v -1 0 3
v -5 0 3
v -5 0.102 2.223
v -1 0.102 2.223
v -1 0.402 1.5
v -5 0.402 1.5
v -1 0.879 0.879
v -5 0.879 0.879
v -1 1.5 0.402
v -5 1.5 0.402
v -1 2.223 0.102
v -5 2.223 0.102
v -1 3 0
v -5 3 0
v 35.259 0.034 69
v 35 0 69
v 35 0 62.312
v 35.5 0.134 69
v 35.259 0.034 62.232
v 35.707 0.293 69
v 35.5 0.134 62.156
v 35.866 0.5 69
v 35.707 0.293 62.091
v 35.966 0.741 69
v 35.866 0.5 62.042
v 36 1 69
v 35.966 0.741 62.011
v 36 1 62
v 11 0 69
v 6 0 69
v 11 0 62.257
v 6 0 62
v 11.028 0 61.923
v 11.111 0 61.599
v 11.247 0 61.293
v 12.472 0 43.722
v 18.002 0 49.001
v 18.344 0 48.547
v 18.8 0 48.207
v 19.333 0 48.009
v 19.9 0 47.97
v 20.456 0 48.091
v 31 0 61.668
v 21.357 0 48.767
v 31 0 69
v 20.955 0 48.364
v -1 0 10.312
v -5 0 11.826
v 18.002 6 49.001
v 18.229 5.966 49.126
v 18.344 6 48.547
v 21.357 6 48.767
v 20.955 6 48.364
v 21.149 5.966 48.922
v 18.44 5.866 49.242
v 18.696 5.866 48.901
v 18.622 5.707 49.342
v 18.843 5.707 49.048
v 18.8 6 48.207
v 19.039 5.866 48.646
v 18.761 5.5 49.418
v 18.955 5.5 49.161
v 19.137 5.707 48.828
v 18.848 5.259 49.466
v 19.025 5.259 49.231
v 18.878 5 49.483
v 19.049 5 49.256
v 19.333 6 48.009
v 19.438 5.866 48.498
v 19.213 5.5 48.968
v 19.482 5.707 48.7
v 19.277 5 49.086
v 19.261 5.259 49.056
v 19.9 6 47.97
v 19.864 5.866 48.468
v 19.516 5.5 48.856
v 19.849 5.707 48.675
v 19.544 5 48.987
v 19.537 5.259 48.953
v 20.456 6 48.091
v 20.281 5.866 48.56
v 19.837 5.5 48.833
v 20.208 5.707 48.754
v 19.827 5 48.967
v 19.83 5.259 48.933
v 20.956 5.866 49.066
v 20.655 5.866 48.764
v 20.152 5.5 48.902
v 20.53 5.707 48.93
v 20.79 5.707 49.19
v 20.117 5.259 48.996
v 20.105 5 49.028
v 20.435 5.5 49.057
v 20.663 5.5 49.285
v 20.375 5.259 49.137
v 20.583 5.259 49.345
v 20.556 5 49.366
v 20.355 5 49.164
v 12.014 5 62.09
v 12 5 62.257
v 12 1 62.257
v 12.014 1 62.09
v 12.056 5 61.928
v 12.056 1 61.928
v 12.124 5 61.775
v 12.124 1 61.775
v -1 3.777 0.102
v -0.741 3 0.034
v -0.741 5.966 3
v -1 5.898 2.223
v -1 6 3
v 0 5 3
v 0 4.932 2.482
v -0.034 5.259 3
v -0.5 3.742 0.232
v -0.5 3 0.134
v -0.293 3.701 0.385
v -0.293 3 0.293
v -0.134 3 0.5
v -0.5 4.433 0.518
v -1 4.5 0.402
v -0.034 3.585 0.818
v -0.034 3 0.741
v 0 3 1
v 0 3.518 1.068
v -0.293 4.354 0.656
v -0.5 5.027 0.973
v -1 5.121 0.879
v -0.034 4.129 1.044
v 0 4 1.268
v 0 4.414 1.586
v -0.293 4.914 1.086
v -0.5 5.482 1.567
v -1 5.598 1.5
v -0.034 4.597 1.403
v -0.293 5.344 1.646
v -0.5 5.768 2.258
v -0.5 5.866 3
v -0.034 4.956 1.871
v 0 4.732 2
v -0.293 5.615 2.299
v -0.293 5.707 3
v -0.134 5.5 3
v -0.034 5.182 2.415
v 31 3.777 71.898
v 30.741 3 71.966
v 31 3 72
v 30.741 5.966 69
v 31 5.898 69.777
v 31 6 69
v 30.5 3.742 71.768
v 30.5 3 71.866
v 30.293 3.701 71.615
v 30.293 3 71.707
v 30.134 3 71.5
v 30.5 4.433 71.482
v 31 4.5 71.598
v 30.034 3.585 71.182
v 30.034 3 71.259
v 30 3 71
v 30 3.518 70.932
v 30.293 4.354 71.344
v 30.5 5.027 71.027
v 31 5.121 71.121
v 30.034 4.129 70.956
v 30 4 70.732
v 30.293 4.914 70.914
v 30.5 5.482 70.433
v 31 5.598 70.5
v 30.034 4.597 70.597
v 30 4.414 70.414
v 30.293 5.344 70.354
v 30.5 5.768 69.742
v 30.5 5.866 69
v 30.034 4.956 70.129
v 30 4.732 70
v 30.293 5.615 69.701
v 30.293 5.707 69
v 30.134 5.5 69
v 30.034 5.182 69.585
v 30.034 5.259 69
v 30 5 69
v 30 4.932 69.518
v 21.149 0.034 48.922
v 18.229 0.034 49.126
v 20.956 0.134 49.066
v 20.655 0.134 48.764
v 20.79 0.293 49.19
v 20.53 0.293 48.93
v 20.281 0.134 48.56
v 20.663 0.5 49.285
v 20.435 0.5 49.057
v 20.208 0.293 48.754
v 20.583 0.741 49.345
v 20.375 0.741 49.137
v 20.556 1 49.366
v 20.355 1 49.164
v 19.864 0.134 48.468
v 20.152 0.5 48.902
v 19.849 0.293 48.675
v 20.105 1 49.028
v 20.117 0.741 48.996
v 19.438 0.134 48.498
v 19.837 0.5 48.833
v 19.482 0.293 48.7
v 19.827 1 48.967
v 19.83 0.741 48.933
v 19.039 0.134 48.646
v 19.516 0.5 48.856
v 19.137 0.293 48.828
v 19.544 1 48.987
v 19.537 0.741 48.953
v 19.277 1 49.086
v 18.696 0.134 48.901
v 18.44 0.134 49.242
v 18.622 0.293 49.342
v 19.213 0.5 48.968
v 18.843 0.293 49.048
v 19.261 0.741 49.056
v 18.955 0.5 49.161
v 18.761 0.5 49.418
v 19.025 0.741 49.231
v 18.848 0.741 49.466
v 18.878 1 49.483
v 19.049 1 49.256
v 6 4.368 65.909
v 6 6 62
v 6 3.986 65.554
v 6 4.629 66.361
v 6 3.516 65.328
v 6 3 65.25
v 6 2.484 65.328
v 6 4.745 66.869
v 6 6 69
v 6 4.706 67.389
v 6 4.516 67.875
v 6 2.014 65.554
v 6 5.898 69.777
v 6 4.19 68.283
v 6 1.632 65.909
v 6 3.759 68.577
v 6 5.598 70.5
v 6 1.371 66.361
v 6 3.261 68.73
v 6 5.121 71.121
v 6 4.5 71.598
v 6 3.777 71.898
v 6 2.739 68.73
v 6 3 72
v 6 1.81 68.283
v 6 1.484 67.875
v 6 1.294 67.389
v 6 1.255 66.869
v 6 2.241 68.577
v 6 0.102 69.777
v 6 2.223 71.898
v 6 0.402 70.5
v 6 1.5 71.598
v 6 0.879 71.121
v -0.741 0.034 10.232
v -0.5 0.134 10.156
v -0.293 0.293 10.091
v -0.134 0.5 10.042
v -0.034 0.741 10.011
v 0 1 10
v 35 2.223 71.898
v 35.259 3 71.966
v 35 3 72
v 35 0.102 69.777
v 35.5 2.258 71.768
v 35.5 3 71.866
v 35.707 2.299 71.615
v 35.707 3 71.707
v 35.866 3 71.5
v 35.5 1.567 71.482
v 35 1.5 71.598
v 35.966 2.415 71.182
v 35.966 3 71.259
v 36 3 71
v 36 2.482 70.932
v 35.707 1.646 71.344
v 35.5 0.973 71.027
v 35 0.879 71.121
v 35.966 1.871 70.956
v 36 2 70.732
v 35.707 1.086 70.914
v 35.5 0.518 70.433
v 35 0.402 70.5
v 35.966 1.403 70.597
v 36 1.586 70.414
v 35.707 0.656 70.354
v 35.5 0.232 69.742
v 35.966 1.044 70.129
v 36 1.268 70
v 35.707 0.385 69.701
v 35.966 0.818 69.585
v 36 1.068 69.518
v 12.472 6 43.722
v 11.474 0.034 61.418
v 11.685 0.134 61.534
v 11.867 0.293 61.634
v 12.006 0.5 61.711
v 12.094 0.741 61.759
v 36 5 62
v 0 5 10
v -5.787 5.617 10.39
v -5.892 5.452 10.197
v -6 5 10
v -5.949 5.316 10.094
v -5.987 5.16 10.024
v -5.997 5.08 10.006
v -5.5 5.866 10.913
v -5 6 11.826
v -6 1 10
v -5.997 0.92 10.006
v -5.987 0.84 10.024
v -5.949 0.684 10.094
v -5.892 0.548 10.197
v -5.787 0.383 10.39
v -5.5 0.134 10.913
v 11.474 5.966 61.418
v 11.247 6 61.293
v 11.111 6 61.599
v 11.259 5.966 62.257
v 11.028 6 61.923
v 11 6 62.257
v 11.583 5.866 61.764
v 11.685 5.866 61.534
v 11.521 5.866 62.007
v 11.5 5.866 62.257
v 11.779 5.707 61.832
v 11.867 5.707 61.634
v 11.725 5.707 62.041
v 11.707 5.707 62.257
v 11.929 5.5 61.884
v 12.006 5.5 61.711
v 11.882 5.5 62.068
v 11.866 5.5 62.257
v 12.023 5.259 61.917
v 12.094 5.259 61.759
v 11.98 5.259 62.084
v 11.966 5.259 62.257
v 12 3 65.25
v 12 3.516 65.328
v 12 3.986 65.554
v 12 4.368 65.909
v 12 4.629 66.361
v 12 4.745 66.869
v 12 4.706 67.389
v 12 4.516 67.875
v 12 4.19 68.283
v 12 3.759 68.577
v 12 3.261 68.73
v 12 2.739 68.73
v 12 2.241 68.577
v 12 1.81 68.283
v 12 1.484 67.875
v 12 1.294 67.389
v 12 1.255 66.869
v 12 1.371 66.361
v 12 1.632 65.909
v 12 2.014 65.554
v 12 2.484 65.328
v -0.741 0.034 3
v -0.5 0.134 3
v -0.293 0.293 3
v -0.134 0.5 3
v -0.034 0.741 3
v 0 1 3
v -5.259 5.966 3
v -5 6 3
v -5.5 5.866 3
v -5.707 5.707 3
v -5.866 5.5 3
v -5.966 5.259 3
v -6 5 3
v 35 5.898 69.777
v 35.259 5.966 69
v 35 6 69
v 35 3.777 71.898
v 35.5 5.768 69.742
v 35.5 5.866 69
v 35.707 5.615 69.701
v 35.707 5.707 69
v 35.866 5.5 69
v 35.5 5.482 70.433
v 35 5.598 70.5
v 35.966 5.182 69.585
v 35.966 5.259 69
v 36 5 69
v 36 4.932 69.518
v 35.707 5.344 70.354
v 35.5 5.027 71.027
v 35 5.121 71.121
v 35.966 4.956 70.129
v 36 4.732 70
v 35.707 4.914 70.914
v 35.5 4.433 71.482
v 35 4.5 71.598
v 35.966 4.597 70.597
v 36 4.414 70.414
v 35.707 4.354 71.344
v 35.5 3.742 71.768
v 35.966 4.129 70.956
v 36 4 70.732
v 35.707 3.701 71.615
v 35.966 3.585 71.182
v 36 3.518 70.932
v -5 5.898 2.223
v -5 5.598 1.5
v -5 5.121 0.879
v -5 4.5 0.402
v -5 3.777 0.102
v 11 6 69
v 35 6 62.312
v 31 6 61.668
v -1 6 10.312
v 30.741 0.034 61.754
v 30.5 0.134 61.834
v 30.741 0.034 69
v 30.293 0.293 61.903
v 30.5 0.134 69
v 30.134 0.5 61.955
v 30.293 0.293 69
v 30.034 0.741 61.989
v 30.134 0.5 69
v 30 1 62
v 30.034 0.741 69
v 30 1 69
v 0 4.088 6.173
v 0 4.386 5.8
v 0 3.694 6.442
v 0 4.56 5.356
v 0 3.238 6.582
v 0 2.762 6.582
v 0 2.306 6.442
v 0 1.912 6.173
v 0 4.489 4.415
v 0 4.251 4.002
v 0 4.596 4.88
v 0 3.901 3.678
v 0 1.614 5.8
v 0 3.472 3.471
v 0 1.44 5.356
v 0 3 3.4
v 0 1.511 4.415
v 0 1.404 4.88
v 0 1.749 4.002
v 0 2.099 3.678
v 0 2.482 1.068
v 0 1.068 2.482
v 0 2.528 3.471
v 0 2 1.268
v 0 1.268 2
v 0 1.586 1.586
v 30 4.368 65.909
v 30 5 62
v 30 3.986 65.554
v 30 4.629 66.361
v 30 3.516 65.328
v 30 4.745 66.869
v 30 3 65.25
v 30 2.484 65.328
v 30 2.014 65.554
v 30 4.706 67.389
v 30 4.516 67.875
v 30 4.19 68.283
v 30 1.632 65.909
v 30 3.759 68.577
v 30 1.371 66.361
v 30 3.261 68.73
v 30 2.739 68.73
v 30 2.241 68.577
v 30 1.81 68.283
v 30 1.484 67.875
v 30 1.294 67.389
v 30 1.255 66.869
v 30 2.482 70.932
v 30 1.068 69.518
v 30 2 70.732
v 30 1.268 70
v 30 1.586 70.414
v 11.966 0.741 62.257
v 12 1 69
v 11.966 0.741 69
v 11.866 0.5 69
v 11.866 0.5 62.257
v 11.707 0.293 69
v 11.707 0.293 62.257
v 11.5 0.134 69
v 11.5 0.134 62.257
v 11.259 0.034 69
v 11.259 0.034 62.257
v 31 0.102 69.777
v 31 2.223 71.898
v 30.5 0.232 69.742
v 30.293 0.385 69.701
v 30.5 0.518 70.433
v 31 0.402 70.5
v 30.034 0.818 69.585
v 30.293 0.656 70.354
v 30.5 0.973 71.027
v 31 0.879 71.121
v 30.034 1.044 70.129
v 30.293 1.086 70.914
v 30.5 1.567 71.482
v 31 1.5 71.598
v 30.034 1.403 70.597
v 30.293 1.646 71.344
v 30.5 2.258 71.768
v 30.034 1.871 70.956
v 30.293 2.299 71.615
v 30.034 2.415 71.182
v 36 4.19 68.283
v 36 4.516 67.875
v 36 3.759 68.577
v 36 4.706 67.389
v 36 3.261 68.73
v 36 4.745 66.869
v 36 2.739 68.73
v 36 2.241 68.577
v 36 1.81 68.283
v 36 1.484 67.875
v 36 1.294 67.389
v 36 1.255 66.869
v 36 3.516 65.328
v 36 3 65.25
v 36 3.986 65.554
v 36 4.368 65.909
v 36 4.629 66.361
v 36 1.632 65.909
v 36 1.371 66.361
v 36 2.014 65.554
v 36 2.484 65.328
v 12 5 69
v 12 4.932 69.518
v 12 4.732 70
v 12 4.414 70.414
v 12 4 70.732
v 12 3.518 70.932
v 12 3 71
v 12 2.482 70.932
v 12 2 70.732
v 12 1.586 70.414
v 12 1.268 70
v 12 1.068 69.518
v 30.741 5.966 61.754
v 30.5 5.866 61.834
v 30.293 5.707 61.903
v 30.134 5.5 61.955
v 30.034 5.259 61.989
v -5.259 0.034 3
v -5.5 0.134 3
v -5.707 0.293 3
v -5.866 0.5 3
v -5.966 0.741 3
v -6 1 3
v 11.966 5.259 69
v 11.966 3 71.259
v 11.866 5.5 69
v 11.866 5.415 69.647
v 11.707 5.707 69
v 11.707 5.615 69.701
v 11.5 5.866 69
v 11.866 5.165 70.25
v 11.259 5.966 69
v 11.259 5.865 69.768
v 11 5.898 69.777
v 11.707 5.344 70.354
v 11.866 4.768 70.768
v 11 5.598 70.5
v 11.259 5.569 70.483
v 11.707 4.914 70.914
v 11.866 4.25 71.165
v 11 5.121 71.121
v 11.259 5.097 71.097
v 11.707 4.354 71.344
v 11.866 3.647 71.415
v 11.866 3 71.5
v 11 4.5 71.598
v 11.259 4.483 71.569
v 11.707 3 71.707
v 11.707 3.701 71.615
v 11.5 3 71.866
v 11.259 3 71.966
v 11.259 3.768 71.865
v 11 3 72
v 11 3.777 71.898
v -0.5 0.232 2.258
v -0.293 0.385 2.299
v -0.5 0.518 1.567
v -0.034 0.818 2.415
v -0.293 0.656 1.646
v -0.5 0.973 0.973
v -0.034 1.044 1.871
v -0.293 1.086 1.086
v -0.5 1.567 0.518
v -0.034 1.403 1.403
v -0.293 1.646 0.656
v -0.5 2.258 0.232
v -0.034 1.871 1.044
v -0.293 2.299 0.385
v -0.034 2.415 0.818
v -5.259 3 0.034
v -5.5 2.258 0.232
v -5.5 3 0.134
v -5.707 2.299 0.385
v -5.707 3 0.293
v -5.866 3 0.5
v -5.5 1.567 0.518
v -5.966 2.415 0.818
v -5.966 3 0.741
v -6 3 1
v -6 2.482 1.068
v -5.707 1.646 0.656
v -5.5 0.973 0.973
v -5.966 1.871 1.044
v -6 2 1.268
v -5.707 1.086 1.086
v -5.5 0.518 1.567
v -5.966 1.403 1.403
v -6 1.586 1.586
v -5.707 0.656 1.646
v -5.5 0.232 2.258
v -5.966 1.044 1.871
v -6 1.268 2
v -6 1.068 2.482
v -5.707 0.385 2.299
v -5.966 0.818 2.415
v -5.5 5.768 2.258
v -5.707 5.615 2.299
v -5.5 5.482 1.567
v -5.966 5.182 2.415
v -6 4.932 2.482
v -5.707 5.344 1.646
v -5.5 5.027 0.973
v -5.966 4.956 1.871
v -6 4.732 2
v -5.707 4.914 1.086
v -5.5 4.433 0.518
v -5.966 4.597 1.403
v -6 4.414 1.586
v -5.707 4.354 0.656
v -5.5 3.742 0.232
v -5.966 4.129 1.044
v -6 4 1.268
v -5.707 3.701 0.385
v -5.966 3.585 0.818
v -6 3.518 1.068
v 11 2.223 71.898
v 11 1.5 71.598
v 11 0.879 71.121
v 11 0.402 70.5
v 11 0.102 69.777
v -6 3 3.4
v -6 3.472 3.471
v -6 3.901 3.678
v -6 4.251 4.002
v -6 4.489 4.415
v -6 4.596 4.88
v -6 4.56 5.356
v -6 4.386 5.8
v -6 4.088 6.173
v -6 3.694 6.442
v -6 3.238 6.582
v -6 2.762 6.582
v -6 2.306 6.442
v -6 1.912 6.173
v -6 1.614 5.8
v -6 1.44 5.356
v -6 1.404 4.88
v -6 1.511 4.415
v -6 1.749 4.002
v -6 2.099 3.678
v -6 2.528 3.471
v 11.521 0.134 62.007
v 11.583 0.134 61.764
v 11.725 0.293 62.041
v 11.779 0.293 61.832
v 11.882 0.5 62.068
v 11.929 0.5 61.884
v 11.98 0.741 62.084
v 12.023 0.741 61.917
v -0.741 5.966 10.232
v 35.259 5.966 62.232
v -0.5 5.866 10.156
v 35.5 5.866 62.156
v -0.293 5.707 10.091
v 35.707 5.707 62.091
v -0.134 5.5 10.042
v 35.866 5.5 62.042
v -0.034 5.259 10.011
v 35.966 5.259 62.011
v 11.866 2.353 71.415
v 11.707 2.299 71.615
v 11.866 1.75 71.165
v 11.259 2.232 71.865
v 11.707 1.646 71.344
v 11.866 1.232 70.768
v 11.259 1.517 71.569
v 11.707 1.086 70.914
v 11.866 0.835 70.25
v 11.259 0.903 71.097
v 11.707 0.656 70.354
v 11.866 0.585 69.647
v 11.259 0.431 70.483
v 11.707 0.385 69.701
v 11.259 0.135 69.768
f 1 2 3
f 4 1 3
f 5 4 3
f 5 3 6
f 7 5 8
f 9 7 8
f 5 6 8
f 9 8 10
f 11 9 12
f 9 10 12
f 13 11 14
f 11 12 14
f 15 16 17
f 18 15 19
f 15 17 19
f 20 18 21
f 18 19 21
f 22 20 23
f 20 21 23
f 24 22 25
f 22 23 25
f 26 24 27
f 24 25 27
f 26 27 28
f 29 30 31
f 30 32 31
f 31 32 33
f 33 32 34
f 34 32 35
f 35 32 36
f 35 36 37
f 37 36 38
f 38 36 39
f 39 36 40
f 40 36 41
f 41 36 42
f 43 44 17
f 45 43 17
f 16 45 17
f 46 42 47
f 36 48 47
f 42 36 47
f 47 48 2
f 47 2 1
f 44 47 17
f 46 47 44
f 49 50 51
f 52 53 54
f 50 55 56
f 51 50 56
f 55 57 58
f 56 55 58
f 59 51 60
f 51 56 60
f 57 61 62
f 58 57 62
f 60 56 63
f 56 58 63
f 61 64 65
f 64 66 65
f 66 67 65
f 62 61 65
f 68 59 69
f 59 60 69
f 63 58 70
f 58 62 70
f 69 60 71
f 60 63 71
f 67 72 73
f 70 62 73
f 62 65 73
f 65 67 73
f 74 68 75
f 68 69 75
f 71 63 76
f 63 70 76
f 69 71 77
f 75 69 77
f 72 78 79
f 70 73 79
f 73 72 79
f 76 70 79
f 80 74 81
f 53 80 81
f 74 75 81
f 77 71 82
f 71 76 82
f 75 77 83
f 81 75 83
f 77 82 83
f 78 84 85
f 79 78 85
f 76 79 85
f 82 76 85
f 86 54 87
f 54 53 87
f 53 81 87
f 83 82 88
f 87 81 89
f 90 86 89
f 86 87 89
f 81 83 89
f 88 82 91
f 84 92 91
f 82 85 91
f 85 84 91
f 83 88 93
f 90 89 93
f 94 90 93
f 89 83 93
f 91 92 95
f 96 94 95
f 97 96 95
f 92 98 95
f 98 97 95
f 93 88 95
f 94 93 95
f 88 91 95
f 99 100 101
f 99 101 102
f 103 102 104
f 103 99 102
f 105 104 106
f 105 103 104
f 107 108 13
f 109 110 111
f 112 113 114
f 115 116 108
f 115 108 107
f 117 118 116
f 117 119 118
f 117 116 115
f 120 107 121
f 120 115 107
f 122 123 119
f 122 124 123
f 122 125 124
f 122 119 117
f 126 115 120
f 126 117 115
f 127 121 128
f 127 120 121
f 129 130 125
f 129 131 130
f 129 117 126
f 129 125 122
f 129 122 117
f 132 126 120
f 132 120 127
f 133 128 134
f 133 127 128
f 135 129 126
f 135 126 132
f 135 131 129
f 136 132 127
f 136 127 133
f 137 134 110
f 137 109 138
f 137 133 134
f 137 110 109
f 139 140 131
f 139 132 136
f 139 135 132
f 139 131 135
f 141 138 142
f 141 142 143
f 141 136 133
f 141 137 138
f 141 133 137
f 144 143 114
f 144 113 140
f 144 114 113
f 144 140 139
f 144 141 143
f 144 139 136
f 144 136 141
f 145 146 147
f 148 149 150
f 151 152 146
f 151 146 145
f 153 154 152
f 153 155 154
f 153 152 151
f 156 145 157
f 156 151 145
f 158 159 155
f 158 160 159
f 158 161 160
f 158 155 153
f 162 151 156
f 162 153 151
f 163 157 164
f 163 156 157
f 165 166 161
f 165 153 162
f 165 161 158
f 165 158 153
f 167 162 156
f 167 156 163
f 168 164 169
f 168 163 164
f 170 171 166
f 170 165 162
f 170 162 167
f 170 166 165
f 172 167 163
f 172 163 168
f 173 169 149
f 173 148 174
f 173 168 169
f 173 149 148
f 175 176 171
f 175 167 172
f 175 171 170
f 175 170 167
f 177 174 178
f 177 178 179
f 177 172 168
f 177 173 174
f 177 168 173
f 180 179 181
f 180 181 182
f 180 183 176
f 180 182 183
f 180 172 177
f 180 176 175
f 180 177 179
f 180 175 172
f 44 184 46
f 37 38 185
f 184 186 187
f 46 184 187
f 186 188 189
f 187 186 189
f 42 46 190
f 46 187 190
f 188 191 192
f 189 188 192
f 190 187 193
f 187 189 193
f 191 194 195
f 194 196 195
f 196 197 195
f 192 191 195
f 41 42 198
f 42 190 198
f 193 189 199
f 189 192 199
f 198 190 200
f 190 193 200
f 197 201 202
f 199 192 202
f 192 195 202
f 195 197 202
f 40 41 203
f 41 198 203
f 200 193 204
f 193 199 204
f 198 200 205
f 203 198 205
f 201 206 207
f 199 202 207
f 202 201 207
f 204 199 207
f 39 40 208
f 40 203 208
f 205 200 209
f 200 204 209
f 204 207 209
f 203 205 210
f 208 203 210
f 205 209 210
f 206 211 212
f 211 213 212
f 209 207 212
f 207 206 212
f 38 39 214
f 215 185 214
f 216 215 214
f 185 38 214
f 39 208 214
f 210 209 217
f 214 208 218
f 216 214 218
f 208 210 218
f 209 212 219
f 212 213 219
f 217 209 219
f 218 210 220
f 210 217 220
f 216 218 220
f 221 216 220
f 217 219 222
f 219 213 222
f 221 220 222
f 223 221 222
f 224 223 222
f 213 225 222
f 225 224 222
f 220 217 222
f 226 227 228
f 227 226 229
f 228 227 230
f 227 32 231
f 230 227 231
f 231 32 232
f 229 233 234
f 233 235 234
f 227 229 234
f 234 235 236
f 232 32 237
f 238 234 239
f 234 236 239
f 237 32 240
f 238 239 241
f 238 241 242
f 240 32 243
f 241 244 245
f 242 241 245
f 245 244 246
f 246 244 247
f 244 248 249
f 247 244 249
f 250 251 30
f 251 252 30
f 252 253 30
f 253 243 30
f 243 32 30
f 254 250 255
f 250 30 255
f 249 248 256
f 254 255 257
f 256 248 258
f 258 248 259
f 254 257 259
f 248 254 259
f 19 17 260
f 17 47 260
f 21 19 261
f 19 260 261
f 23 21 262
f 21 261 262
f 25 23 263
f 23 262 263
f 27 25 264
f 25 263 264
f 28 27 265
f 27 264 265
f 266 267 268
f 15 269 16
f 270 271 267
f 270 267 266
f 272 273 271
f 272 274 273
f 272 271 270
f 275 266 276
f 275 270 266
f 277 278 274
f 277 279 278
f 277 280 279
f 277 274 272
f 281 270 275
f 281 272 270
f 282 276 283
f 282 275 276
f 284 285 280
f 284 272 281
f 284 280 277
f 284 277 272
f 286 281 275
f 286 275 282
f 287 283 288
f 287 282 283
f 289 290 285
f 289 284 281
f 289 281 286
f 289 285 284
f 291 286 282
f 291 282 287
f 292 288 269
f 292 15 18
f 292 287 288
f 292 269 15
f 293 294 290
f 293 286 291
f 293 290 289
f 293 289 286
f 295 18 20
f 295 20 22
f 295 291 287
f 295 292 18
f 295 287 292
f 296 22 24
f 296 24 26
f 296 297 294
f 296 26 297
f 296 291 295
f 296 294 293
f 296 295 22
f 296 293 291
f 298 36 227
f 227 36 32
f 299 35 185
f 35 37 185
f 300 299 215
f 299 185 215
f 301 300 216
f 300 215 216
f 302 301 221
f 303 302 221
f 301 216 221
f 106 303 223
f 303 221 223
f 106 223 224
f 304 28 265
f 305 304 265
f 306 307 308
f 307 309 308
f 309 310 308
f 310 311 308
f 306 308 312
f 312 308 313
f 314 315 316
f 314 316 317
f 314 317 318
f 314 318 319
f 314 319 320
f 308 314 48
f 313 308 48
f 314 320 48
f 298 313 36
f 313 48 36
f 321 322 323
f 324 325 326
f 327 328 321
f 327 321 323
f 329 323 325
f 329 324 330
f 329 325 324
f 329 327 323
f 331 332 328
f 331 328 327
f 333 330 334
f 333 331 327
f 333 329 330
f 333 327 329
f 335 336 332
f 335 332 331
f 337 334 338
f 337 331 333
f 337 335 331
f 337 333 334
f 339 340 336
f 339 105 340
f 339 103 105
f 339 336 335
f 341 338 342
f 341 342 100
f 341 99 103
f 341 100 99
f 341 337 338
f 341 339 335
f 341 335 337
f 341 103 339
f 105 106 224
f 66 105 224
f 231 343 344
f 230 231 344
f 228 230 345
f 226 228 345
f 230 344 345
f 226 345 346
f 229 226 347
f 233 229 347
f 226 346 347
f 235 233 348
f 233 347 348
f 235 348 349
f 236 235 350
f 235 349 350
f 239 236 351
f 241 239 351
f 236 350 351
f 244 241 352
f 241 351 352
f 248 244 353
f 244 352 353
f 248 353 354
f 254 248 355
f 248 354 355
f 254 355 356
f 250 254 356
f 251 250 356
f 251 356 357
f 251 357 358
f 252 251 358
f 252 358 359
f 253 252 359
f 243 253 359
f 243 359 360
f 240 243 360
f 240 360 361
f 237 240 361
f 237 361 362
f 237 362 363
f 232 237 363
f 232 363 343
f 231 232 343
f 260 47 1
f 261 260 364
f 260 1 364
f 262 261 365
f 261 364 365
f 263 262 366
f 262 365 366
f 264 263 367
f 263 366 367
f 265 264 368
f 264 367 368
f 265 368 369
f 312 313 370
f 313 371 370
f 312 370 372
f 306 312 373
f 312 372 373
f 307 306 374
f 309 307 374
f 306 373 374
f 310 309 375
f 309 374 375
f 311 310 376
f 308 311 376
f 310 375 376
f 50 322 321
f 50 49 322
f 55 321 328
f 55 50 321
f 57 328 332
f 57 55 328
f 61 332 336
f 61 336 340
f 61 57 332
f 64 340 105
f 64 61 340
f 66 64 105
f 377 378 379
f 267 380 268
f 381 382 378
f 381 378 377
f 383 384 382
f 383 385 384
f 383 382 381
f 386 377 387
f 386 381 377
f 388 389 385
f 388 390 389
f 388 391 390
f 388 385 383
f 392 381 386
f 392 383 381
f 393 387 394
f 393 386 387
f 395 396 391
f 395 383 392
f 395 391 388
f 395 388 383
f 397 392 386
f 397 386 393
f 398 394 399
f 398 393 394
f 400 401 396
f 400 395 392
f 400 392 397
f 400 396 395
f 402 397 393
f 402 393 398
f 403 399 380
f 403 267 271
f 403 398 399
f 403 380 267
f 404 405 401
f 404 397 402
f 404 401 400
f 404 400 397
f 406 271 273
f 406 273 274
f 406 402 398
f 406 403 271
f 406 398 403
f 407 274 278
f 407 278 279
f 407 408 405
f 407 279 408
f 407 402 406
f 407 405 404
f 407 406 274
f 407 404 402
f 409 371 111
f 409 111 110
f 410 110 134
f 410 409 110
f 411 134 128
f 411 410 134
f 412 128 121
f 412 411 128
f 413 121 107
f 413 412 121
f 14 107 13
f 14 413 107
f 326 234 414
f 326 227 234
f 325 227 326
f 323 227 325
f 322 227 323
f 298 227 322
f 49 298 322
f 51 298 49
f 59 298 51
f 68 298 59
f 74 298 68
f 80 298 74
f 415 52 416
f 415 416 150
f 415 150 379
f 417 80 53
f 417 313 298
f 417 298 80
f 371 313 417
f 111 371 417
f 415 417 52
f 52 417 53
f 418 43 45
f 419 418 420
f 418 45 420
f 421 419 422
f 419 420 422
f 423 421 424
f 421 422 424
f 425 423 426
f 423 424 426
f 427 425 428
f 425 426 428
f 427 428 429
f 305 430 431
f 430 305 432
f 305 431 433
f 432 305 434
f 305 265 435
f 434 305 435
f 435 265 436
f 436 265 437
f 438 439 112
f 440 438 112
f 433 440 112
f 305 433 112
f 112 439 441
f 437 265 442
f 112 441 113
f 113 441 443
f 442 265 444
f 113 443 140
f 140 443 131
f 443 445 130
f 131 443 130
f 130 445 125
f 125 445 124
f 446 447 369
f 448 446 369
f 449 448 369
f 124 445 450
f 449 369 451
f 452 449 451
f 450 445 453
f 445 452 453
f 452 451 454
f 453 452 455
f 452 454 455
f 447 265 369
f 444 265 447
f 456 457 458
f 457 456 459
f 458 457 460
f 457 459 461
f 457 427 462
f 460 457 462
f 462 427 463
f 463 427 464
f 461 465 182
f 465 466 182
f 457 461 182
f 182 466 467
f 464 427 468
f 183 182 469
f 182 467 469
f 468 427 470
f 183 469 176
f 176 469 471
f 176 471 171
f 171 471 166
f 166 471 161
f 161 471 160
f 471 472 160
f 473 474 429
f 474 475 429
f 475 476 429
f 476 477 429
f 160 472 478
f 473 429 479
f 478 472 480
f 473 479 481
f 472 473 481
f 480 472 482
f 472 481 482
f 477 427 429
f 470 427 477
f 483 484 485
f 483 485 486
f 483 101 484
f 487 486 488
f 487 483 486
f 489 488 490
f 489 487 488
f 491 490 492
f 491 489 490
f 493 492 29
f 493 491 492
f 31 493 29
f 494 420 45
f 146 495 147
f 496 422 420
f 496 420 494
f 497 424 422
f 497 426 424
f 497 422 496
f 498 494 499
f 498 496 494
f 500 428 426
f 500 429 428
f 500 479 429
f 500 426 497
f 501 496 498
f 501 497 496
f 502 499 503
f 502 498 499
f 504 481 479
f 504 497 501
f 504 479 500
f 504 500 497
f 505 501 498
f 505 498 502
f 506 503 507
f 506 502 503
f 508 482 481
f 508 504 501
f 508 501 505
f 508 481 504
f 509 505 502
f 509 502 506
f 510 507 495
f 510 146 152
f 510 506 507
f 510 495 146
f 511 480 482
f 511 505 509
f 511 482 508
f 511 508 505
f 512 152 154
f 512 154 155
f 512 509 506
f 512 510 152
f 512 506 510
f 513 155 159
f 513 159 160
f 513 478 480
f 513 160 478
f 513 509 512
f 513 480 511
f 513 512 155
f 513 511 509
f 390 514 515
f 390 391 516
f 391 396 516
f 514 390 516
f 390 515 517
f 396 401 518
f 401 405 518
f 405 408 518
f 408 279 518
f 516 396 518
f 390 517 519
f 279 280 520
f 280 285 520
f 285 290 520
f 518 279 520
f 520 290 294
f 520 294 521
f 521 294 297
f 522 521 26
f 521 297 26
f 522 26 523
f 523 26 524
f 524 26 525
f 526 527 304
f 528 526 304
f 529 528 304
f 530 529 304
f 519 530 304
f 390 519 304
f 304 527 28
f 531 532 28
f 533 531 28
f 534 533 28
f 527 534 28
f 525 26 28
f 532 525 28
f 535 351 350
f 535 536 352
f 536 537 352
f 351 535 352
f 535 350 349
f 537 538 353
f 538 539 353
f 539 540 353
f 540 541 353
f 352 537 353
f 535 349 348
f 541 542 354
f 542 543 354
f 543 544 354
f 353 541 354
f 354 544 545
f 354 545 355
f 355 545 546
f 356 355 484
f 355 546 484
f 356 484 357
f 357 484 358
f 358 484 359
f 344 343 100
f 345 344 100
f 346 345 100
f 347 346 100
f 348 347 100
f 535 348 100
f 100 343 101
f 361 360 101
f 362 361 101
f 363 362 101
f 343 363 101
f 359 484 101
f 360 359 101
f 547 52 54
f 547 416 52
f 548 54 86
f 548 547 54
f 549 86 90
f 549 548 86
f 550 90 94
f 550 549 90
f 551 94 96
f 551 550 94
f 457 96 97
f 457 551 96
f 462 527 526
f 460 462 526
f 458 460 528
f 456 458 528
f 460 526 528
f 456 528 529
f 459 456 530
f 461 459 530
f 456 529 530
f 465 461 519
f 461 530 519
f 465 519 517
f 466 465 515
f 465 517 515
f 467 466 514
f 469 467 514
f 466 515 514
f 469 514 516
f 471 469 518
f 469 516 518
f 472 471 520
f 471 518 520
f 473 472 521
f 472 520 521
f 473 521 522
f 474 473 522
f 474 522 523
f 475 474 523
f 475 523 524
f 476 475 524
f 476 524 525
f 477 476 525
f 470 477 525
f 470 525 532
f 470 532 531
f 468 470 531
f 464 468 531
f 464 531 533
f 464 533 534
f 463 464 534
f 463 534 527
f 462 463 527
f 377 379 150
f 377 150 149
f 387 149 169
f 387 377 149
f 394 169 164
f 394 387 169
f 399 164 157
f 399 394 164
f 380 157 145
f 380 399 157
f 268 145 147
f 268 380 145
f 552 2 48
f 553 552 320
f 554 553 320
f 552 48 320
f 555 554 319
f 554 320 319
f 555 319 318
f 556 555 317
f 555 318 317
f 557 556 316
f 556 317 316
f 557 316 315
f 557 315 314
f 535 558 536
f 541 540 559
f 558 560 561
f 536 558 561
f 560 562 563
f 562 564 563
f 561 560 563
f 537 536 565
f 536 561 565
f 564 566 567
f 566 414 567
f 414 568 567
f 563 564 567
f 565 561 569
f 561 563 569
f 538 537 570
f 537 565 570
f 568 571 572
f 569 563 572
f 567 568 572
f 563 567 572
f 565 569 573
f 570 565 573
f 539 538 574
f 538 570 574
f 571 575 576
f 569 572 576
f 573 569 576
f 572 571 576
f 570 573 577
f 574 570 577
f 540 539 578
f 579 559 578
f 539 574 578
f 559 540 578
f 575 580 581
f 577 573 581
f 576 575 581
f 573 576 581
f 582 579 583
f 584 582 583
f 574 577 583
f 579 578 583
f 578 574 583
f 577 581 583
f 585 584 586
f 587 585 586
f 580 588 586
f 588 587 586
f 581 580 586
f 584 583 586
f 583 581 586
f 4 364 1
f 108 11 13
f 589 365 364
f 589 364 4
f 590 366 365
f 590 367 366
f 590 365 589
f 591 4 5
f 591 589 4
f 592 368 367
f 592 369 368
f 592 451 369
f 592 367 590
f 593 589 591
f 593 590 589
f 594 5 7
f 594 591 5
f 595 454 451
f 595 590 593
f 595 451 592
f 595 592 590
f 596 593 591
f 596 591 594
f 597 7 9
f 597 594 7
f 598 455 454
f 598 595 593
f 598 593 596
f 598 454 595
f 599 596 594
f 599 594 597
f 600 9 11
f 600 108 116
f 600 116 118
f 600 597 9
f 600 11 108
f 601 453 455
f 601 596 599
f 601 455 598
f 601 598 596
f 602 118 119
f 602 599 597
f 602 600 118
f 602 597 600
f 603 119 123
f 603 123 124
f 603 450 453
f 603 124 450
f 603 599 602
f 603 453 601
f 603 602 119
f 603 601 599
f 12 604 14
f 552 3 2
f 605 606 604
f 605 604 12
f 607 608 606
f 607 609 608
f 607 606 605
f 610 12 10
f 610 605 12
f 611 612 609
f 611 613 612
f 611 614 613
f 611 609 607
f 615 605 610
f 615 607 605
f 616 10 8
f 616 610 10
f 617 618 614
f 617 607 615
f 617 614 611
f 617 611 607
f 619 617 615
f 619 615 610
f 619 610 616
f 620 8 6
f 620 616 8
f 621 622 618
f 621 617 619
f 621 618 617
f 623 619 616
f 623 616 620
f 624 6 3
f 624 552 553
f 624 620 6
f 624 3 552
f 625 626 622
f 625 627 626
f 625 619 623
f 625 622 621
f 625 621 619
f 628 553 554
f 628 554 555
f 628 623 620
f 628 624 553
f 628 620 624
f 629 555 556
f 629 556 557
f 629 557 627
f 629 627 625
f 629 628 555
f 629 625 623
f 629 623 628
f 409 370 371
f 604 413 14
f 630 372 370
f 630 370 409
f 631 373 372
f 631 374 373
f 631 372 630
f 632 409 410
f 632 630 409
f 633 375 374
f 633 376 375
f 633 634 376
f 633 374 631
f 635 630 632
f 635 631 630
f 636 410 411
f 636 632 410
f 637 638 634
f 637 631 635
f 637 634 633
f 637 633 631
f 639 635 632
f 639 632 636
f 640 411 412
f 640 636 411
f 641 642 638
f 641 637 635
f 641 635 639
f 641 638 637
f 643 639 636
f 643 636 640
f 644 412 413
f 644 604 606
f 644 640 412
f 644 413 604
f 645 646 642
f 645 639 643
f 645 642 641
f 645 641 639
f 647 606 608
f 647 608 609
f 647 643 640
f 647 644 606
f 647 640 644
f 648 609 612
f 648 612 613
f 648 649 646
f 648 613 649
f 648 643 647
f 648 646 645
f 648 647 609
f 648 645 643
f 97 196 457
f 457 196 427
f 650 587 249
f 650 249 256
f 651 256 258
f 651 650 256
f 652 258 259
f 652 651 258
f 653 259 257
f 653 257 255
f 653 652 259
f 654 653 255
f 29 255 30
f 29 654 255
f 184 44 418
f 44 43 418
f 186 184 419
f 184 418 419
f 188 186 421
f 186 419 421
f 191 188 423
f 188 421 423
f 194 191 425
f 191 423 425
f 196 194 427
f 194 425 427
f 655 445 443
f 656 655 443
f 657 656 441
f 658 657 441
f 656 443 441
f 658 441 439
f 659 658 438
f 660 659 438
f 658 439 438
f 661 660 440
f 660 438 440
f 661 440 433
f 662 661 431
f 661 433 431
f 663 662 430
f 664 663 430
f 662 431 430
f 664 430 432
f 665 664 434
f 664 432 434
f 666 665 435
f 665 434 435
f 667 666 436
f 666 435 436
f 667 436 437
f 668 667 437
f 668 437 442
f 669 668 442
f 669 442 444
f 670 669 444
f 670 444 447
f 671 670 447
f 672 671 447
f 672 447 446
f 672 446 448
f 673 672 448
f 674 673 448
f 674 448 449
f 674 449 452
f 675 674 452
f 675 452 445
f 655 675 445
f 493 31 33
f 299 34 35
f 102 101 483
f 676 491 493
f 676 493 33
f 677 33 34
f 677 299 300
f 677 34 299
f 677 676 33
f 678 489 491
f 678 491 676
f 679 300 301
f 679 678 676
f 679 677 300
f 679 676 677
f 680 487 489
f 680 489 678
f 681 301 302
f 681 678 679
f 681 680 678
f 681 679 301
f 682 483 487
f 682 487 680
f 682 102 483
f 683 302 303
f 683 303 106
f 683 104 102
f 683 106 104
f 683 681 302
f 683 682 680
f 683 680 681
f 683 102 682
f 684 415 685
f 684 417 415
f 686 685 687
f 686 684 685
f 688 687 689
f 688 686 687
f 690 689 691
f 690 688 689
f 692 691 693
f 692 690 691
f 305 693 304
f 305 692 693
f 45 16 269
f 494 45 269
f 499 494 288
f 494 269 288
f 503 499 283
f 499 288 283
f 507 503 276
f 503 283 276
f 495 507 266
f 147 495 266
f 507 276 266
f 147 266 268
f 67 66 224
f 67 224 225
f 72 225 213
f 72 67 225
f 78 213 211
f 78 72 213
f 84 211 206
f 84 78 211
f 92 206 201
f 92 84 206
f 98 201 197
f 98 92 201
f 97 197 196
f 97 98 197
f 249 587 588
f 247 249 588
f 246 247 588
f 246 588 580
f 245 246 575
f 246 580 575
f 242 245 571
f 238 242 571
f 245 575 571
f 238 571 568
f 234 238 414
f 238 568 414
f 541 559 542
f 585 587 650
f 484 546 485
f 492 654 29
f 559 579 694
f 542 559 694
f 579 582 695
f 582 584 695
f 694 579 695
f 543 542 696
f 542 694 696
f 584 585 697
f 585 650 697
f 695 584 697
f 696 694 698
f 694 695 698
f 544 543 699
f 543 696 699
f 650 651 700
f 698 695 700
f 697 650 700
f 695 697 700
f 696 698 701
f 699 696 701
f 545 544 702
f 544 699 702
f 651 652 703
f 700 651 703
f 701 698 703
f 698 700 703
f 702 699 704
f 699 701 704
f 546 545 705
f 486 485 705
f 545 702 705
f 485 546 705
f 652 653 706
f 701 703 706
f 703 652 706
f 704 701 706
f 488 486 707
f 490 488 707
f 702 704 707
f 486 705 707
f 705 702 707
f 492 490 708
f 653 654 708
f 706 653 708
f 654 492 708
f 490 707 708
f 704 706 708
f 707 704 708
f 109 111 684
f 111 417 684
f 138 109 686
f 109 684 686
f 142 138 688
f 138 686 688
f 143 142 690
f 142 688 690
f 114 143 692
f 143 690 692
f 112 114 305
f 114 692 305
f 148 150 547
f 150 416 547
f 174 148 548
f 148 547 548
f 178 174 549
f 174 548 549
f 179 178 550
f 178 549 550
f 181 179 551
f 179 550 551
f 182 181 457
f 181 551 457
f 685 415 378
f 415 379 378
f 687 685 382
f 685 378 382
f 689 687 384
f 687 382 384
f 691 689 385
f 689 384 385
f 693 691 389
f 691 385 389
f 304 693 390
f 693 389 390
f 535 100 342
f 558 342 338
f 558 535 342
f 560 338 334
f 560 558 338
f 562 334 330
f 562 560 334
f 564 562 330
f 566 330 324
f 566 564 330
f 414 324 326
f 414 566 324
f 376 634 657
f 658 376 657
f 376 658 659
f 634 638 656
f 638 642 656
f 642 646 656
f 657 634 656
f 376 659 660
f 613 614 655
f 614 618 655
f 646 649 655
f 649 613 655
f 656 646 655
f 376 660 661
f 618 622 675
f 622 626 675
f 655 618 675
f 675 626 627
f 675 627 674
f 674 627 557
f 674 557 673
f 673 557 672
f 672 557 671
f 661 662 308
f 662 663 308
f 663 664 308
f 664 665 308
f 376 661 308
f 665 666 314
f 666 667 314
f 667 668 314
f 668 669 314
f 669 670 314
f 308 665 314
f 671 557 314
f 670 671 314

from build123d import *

# Parameters (mm, degrees)
BOSS_EXTRUDE1_DEPTH = 6
SKETCH3_R           = 1.75
CUT_EXTRUDE1_DEPTH  = 84.570329663
SKETCH4_R           = 1.6
CUT_EXTRUDE2_DEPTH  = 81.721744282
FILLET1_R           = 3
FILLET2_R           = 1


with BuildPart() as part:
    # Sketch2 → Boss-Extrude1 (new body)
    with BuildSketch(Plane(origin=(0, 0, 0), x_dir=(1, 0, 0), z_dir=(0, 1, 0))):
        Polygon((6, -72), (12, -72), (12, -62), (19.625958238, -48.121978446), (30, -62), (30, -72), (36, -72), (36, -62), (0, -10), (0, 0), (-6, 0), (-6, -10), (12.471726571, -43.721673541), (6, -62), align=None)
    extrude(amount=BOSS_EXTRUDE1_DEPTH)

    # Sketch3 → Cut-Extrude1 (cut, through all)
    with BuildSketch(Plane(origin=(36, 0, 0), x_dir=(0, 0, -1), z_dir=(1, 0, 0))):
        with Locations((-67, 3)):
            Circle(SKETCH3_R)
    extrude(amount=-CUT_EXTRUDE1_DEPTH, mode=Mode.SUBTRACT)

    # Sketch4 → Cut-Extrude2 (cut, through all)
    with BuildSketch(Plane(origin=(0, 0, 0), x_dir=(0, 0, -1), z_dir=(1, 0, 0))):
        with Locations((-5, 3)):
            Circle(SKETCH4_R)
    extrude(amount=-CUT_EXTRUDE2_DEPTH, mode=Mode.SUBTRACT)

    # Fillet1
    fillet1_edges = [part.edges().sort_by_distance(p)[0] for p in [
        (-3, 0, 0),
        (-3, 6, 0),
        (33, 0, 72),
        (33, 6, 72),
        (9, 0, 72),
        (9, 6, 72),
    ]]
    fillet(fillet1_edges, radius=FILLET1_R - 0.0001)  # a hair under: the kernel refuses the full size

    # Fillet2
    fillet2_edges = [part.edges().sort_by_distance(p)[0] for p in [
        (0, 0, 6.49995),
        (18, 0, 36),
        (30, 0, 65.50005),
        (24.812979119, 0, 55.060989223),
        (15.812979119, 0, 55.060989223),
        (19.625958238, 3, 48.121978446),
        (12, 3, 62),
        (15.812979119, 6, 55.060989223),
        (24.812979119, 6, 55.060989223),
        (30, 6, 65.50005),
        (18, 6, 36),
        (0, 6, 6.49995),
        (-6, 0, 6.49995),
        (-6, 6, 6.49995),
        (-6, 5.121349633, 0.878650367),
        (-6, 0.878650367, 0.878650367),
        (36, 0, 65.50005),
        (12, 0, 65.50005),
        (0, 5.121349633, 0.878650367),
        (0, 0.878650367, 0.878650367),
        (12, 6, 65.50005),
        (36, 6, 65.50005),
        (36, 5.121349633, 71.121349633),
        (36, 0.878650367, 71.121349633),
        (30, 5.121349633, 71.121349633),
        (30, 0.878650367, 71.121349633),
        (12, 5.121349633, 71.121349633),
        (12, 0.878650367, 71.121349633),
    ]]
    fillet(fillet2_edges, radius=FILLET2_R)


solid = part.part
